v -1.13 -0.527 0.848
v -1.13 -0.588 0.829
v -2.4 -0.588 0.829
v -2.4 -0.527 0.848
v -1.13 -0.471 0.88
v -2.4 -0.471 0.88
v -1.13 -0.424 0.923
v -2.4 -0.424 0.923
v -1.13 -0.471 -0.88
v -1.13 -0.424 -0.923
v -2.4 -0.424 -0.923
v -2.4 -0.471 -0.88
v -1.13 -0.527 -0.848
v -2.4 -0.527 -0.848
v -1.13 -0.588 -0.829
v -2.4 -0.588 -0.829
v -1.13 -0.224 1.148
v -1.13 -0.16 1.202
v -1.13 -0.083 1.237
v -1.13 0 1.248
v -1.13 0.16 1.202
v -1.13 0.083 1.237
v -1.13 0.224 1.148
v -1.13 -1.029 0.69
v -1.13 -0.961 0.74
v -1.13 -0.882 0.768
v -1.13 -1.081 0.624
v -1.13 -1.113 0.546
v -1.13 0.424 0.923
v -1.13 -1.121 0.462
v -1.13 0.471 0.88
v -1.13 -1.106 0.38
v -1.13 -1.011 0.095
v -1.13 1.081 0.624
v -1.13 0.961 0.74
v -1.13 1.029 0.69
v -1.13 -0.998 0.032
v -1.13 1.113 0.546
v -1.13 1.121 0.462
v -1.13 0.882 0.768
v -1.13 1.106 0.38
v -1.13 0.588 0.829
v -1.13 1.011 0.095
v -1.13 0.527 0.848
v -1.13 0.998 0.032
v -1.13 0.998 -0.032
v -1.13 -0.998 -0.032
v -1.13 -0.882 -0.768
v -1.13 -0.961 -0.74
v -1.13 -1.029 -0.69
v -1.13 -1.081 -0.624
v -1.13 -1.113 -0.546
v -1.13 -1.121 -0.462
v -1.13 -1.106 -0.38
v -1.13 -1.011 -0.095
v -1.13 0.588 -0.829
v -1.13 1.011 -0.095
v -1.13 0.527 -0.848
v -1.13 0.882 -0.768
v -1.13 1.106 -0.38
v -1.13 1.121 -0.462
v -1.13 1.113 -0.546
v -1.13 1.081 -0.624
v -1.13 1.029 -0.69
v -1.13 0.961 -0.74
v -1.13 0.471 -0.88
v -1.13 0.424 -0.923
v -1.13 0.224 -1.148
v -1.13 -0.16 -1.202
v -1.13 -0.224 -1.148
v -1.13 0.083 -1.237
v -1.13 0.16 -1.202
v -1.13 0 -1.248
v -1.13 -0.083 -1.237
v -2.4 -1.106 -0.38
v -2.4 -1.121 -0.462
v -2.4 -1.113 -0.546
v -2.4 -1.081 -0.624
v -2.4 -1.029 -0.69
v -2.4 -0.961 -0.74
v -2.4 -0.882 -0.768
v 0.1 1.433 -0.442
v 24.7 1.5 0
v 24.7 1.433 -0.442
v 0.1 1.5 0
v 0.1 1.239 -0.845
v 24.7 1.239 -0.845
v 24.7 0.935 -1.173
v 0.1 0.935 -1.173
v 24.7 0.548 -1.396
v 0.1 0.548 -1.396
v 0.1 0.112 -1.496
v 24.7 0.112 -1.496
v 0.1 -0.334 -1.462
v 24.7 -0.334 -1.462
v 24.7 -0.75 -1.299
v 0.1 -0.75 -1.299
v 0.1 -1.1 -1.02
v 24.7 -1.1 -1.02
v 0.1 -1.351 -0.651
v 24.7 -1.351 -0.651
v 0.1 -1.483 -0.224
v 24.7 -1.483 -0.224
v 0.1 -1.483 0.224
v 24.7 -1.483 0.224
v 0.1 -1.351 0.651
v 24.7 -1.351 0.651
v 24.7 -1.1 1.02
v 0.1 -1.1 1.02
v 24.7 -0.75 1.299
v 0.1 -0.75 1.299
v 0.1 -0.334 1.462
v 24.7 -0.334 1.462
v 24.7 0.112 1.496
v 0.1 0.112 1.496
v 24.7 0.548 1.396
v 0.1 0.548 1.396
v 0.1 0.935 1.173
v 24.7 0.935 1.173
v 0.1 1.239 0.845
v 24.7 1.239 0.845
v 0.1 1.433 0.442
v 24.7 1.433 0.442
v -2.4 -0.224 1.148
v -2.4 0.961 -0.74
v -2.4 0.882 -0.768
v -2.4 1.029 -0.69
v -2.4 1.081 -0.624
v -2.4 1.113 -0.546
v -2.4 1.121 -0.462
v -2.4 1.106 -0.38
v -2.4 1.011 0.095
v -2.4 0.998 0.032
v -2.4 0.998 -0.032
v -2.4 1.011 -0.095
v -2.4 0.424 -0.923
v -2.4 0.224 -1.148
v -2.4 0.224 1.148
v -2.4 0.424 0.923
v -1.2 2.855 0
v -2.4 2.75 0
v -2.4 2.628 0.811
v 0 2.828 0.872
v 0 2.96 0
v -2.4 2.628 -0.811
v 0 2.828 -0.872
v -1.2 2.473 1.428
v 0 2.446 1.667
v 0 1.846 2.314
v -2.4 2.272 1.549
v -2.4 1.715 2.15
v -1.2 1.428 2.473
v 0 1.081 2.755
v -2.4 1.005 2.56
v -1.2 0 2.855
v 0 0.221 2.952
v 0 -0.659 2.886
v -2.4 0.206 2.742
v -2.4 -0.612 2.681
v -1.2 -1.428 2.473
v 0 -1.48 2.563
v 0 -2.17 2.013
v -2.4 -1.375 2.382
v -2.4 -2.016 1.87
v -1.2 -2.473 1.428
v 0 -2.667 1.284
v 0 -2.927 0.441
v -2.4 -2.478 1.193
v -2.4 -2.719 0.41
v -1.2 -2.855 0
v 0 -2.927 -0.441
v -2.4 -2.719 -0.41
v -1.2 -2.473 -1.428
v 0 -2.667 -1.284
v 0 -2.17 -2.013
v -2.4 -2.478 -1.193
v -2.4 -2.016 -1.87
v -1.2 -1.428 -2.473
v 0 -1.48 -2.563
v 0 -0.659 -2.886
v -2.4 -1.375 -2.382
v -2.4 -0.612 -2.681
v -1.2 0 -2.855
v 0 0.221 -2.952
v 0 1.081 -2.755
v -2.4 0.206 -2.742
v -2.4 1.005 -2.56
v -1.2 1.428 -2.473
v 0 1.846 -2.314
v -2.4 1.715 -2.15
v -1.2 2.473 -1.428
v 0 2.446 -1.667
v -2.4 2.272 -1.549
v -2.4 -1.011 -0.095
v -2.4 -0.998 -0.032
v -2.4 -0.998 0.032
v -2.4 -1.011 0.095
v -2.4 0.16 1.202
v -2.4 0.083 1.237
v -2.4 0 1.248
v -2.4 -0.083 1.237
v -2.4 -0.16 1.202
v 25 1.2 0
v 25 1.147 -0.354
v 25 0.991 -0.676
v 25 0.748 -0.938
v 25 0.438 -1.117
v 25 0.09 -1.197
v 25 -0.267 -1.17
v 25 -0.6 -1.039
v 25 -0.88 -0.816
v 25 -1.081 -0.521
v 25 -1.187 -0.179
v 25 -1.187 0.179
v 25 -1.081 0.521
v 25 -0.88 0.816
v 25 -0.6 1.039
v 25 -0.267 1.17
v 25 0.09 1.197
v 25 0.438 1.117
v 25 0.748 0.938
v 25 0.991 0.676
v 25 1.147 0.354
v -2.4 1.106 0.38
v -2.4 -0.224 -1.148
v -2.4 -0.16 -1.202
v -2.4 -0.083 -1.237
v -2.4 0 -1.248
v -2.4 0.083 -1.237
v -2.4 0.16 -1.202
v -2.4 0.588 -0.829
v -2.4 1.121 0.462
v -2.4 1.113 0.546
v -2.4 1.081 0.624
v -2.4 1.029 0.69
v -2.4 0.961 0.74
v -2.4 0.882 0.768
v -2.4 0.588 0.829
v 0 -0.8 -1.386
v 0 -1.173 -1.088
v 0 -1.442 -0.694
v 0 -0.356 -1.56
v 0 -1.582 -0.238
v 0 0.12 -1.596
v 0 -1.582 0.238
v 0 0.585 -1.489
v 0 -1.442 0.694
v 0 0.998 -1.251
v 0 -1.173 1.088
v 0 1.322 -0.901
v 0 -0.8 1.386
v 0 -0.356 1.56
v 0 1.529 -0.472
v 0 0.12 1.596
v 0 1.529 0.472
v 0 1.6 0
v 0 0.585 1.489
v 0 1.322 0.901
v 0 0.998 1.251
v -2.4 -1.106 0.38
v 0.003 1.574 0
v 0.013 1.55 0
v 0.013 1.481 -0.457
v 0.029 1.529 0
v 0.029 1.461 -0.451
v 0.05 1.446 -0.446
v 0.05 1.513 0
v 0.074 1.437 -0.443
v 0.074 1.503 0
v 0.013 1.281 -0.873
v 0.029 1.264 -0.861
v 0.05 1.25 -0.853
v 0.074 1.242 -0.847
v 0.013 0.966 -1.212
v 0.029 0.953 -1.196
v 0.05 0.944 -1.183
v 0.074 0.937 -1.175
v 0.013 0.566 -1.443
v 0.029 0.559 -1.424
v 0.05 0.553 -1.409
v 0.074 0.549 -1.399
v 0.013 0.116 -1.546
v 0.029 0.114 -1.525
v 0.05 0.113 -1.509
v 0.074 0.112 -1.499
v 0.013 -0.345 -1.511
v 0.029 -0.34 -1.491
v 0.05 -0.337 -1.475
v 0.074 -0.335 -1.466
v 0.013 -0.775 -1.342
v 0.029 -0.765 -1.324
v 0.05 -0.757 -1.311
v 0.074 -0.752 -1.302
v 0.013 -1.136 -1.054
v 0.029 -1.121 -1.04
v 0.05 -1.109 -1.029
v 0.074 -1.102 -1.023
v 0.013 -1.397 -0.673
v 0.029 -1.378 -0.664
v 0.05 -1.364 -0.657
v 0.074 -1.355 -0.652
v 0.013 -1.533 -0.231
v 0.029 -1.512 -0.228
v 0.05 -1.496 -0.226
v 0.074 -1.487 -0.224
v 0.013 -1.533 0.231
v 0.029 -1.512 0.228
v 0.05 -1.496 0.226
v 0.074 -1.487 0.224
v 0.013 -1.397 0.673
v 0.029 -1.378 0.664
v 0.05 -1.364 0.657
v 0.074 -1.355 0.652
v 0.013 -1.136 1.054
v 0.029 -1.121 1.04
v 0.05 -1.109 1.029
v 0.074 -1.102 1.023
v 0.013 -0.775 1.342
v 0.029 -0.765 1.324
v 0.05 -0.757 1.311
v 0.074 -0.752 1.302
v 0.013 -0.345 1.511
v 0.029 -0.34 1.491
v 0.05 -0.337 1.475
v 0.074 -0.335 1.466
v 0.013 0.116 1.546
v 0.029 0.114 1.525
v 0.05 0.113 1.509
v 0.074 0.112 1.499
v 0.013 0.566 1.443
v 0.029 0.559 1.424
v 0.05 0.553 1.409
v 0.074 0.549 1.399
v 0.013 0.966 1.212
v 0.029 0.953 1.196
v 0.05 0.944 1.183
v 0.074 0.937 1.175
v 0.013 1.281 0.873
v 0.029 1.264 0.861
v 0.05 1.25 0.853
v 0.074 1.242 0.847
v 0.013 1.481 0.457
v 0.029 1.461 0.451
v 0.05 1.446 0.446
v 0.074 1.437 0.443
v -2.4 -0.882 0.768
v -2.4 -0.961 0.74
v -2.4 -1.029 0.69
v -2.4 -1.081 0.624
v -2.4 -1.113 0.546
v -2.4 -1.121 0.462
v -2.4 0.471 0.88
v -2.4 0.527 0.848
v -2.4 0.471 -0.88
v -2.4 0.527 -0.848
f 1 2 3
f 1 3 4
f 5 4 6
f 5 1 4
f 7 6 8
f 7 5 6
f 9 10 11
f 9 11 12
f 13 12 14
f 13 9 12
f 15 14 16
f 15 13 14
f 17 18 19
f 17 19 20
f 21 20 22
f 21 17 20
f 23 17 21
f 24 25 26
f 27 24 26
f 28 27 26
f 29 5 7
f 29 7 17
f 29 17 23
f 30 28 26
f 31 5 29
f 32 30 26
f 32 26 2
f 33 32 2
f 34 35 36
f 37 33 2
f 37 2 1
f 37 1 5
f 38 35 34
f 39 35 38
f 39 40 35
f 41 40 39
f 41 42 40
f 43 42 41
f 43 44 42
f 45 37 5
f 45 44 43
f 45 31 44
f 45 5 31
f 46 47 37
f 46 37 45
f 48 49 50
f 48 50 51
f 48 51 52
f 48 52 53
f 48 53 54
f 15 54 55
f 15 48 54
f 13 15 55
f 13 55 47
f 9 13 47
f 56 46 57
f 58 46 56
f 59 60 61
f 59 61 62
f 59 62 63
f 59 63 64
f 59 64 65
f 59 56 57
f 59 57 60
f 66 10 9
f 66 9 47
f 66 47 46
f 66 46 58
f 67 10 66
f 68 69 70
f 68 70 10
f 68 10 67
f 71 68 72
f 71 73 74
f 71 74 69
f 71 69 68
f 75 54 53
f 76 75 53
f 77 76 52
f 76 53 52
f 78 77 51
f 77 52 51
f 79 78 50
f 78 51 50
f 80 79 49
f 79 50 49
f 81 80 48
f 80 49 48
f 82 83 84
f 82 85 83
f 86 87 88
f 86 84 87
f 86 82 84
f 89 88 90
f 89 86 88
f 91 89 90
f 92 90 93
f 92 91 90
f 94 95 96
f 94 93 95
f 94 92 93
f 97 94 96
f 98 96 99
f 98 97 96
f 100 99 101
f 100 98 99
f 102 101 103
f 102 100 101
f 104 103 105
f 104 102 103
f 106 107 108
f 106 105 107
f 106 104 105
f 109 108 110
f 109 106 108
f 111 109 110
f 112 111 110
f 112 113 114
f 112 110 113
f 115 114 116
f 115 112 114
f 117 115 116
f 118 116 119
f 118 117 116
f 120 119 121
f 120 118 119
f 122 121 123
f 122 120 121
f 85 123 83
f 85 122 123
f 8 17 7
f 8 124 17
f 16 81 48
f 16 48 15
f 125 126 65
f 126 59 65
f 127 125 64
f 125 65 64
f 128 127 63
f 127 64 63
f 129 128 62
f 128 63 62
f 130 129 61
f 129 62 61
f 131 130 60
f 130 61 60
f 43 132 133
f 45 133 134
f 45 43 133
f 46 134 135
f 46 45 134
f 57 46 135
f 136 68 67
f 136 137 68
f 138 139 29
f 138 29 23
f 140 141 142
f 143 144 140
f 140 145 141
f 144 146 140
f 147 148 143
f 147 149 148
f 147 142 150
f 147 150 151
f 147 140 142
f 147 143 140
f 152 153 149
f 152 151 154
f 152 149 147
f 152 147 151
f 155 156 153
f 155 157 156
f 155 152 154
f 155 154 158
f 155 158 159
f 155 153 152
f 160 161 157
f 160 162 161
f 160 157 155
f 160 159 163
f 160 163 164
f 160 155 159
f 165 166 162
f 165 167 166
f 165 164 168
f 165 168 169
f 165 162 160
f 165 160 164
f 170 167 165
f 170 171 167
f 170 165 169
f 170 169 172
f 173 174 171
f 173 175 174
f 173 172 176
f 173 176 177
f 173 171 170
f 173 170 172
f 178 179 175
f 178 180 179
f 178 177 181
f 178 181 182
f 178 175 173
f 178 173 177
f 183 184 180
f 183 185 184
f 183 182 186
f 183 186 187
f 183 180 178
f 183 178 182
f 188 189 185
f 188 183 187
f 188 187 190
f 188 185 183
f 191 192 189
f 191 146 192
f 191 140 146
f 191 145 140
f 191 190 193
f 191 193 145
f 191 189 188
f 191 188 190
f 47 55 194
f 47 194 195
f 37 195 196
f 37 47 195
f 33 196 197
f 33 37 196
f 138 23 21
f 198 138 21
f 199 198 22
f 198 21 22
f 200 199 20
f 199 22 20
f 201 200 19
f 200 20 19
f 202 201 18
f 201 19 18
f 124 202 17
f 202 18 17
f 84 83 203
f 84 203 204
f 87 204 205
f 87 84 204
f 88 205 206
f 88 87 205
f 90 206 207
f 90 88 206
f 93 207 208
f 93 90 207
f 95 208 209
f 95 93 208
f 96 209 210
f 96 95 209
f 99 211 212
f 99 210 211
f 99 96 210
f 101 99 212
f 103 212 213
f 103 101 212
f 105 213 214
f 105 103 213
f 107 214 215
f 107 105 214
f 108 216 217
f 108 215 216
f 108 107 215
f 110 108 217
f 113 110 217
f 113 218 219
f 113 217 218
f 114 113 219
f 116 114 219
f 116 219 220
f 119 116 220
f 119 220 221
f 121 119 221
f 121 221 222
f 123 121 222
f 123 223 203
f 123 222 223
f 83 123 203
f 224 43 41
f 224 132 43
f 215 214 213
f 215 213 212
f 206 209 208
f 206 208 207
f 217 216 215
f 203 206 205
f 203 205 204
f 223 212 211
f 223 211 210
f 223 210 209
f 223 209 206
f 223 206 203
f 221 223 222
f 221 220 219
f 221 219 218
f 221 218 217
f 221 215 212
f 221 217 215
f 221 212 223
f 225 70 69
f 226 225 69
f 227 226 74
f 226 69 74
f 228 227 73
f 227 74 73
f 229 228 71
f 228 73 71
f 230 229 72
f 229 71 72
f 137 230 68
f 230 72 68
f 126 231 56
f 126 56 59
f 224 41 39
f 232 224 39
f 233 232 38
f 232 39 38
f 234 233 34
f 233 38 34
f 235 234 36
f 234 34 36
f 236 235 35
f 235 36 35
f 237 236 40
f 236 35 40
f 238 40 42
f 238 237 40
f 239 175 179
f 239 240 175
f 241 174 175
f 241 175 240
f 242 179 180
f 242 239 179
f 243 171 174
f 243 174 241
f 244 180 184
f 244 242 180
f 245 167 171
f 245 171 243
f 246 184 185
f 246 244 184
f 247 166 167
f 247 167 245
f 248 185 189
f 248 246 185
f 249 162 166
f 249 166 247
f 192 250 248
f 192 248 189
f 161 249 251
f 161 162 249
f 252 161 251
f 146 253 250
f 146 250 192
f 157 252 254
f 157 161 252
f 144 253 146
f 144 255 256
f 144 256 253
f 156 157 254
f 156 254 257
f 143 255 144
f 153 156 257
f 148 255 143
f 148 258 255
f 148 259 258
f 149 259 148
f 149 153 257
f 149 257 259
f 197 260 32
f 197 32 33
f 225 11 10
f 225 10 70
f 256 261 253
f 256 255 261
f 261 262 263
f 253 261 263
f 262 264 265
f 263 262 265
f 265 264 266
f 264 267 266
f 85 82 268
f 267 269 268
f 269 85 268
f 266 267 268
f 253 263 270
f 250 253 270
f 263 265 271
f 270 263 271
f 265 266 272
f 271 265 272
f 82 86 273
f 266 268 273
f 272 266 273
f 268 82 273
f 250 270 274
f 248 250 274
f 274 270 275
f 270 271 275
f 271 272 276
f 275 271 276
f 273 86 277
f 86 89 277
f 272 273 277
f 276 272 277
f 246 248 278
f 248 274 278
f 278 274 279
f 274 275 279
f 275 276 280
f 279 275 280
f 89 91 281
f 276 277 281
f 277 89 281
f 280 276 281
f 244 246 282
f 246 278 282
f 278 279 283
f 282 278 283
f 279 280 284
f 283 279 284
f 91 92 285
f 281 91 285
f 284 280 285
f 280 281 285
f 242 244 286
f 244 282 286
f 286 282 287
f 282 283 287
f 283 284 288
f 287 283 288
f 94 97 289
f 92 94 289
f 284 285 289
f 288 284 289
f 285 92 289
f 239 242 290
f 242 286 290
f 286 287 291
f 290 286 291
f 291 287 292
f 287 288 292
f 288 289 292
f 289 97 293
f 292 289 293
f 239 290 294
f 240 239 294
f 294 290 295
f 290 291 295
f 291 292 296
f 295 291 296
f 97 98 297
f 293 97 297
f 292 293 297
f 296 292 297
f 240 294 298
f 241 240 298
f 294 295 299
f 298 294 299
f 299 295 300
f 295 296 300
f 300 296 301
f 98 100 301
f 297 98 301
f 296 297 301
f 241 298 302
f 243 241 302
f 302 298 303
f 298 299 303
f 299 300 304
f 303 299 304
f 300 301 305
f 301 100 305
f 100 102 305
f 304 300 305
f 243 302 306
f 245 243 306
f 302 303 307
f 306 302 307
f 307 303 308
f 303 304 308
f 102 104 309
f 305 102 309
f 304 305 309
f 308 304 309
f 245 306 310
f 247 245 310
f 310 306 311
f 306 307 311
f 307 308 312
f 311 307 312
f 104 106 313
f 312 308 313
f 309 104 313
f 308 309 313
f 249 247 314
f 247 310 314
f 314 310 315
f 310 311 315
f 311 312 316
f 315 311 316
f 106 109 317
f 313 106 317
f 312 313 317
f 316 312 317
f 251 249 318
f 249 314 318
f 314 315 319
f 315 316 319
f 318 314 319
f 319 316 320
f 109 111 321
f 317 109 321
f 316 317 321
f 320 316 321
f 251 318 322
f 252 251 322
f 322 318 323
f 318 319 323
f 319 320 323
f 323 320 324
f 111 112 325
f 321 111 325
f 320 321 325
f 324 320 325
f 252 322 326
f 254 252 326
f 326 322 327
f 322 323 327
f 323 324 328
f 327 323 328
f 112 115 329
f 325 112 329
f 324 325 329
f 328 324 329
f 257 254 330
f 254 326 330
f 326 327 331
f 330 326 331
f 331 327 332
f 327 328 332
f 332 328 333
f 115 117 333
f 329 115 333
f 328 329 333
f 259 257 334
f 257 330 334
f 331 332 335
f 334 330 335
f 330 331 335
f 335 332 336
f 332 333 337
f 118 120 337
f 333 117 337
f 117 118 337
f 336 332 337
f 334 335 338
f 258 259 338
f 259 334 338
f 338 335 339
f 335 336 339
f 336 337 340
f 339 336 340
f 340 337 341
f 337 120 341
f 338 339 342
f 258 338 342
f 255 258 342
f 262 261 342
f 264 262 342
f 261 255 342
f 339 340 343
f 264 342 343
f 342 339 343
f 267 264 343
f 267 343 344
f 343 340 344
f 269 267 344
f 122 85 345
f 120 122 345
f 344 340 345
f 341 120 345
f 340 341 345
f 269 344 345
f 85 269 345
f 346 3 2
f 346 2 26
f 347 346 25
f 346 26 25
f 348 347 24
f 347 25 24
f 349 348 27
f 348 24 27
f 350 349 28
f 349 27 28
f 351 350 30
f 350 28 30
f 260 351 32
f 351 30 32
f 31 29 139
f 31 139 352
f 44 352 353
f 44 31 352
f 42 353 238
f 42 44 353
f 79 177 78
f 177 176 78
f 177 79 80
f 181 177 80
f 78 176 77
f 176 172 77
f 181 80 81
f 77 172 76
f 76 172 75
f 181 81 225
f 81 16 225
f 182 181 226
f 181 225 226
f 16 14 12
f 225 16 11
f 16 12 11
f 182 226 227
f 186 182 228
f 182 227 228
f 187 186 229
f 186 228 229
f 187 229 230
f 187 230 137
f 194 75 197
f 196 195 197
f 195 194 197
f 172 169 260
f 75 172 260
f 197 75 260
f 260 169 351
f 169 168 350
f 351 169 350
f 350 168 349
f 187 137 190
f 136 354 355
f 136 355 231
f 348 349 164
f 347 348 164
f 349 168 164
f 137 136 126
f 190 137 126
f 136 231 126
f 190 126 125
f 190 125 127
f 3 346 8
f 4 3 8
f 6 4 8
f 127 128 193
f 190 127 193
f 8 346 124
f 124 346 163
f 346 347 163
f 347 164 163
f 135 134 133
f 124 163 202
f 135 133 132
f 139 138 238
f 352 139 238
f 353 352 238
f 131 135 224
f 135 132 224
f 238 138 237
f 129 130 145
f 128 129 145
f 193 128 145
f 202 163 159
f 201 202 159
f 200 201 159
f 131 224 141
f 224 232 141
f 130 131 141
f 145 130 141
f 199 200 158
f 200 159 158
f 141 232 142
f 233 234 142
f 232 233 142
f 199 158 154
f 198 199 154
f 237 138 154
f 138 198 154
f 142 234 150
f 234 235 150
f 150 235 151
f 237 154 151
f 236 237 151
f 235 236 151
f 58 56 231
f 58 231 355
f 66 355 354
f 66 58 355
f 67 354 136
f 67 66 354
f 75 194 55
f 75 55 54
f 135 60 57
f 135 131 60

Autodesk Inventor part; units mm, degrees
ref_plane "YZ Plane" through (0, 0, 0) normal (1, 0, 0) x (0, 1, 0)
ref_plane "XZ Plane" through (0, 0, 0) normal (0, 1, 0) x (-1, 0, 0)
ref_plane "XY Plane" through (0, 0, 0) normal (0, 0, 1) x (1, 0, 0)
sketch "Sketch1" plane through (0, 0, 0) normal (0, 0, 1) x (1, 0, 0)
  line L0 (0, 0) -> (25, 0)
  line L1 (25, 0) -> (25, 1.5)
  line L2 (25, 1.5) -> (0, 1.5)
  line L3 (0, 1.5) -> (0, 0)
  line L4 (0, 0) -> (-2.4, 0)
  line L5 (-2.4, 0) -> (-2.4, 2.75)
  line L6 (-2.4, 2.75) -> (0, 2.96)
  line L7 (0, 2.96) -> (0, 0)
  dimension "d0" = 3
  dimension "d3" = 25
  dimension "d46" = 85
  dimension "d47" = 2.4
  dimension "d49" = 5.5
revolve "Revolution1" add sketch "Sketch1" angle 360 about axis through (0, 0, 0) along (1, 0, 0)
thread "Thread1" size "M3x0.5" class "6g" standard "ISO Metric profile" length 25
sketch "Sketch2" plane through (-2.4, 0, 0) normal (-1, 0, 0) x (0, 0, 1)
  circle A0 centre (0, 0) radius 1.4 construction
  circle A1 centre (0, 0) radius 0.98 construction
  line L0 (-0.8487, -0.49) -> (-1.4, 0)
  line L1 (0, 0) -> (-0.8487, -0.49)
  line L2 (0, 0) -> (-0.8487, 0.49)
  line L3 (-4.144, 0) -> (4.144, 0) construction
  line L4 (-1.4, 0) -> (-0.8487, 0.49)
  dimension "d21" = 2.8
  dimension "d19" = 60
  dimension "d20" = 30
  dimension "d26" = 1.96
extrude "Extrusion1" cut sketch "Sketch2" against normal blind 1.27
pattern_circular "Circular Pattern1" count 6 over 360 about axis through (-2.4, 0, 0) along (1, 0, 0) of "Extrusion1"
fillet "Fillet2" radius 0.3 6 edges at (-1.765, 1.2124, -0.7) (-1.765, 1.2124, 0.7) (-1.765, 0, 1.4) (-1.765, -1.2124, 0.7) (-1.765, -1.2124, -0.7) (-1.765, 0, -1.4)
fillet "Fillet3" radius 0.3 6 edges at (-1.765, 0.98, 0) (-1.765, 0.49, -0.8487) (-1.765, -0.49, -0.8487) (-1.765, -0.98, 0) (-1.765, -0.49, 0.8487) (-1.765, 0.49, 0.8487)
fillet "Fillet5" radius 0.1 1 edges at (0, -1.5, 0)
chamfer "Chamfer2" distance 0.3 angle 45 1 edges at (25, -1.5, 0)
equation "\"d6\" = b"
equation "\"d21\" = A_"
equation "\"d20\" = 0.5 * d19"
equation "\"d26\" = 0.7 * d21"
equation "\"d27\" = t"
equation "\"d32\" = v"
equation "\"d33\" = v"
equation "\"d35\" = r"
equation "\"d36\" = v"
equation "\"d0\" = d"
equation "\"d3\" = l_"
equation "\"d47\" = k"
equation "\"d49\" = dk"
equation "\"A_\" = 2.8"
equation "\"d\" = 3"
equation "\"dk\" = 5.5"
equation "\"k\" = 2.4"
equation "\"l_\" = 25"
equation "\"lg\" = 0"
equation "\"t\" = 1.27"
equation "\"w\" = 0.55"
equation "\"v\" = 0.3"
equation "\"r\" = 0.1"
equation "\"da\" = 2.6"
equation "\"ds_\" = d"
equation "\"ls\" = 0"
equation "\"b\" = l_ - lg"
equation "\"p\" = 0.5"
properties part number "Šroub s válcovou hlavou a šestiramennou drážkou ISO 14580 - M3x25-4.8" material "Ocel, měkká"
